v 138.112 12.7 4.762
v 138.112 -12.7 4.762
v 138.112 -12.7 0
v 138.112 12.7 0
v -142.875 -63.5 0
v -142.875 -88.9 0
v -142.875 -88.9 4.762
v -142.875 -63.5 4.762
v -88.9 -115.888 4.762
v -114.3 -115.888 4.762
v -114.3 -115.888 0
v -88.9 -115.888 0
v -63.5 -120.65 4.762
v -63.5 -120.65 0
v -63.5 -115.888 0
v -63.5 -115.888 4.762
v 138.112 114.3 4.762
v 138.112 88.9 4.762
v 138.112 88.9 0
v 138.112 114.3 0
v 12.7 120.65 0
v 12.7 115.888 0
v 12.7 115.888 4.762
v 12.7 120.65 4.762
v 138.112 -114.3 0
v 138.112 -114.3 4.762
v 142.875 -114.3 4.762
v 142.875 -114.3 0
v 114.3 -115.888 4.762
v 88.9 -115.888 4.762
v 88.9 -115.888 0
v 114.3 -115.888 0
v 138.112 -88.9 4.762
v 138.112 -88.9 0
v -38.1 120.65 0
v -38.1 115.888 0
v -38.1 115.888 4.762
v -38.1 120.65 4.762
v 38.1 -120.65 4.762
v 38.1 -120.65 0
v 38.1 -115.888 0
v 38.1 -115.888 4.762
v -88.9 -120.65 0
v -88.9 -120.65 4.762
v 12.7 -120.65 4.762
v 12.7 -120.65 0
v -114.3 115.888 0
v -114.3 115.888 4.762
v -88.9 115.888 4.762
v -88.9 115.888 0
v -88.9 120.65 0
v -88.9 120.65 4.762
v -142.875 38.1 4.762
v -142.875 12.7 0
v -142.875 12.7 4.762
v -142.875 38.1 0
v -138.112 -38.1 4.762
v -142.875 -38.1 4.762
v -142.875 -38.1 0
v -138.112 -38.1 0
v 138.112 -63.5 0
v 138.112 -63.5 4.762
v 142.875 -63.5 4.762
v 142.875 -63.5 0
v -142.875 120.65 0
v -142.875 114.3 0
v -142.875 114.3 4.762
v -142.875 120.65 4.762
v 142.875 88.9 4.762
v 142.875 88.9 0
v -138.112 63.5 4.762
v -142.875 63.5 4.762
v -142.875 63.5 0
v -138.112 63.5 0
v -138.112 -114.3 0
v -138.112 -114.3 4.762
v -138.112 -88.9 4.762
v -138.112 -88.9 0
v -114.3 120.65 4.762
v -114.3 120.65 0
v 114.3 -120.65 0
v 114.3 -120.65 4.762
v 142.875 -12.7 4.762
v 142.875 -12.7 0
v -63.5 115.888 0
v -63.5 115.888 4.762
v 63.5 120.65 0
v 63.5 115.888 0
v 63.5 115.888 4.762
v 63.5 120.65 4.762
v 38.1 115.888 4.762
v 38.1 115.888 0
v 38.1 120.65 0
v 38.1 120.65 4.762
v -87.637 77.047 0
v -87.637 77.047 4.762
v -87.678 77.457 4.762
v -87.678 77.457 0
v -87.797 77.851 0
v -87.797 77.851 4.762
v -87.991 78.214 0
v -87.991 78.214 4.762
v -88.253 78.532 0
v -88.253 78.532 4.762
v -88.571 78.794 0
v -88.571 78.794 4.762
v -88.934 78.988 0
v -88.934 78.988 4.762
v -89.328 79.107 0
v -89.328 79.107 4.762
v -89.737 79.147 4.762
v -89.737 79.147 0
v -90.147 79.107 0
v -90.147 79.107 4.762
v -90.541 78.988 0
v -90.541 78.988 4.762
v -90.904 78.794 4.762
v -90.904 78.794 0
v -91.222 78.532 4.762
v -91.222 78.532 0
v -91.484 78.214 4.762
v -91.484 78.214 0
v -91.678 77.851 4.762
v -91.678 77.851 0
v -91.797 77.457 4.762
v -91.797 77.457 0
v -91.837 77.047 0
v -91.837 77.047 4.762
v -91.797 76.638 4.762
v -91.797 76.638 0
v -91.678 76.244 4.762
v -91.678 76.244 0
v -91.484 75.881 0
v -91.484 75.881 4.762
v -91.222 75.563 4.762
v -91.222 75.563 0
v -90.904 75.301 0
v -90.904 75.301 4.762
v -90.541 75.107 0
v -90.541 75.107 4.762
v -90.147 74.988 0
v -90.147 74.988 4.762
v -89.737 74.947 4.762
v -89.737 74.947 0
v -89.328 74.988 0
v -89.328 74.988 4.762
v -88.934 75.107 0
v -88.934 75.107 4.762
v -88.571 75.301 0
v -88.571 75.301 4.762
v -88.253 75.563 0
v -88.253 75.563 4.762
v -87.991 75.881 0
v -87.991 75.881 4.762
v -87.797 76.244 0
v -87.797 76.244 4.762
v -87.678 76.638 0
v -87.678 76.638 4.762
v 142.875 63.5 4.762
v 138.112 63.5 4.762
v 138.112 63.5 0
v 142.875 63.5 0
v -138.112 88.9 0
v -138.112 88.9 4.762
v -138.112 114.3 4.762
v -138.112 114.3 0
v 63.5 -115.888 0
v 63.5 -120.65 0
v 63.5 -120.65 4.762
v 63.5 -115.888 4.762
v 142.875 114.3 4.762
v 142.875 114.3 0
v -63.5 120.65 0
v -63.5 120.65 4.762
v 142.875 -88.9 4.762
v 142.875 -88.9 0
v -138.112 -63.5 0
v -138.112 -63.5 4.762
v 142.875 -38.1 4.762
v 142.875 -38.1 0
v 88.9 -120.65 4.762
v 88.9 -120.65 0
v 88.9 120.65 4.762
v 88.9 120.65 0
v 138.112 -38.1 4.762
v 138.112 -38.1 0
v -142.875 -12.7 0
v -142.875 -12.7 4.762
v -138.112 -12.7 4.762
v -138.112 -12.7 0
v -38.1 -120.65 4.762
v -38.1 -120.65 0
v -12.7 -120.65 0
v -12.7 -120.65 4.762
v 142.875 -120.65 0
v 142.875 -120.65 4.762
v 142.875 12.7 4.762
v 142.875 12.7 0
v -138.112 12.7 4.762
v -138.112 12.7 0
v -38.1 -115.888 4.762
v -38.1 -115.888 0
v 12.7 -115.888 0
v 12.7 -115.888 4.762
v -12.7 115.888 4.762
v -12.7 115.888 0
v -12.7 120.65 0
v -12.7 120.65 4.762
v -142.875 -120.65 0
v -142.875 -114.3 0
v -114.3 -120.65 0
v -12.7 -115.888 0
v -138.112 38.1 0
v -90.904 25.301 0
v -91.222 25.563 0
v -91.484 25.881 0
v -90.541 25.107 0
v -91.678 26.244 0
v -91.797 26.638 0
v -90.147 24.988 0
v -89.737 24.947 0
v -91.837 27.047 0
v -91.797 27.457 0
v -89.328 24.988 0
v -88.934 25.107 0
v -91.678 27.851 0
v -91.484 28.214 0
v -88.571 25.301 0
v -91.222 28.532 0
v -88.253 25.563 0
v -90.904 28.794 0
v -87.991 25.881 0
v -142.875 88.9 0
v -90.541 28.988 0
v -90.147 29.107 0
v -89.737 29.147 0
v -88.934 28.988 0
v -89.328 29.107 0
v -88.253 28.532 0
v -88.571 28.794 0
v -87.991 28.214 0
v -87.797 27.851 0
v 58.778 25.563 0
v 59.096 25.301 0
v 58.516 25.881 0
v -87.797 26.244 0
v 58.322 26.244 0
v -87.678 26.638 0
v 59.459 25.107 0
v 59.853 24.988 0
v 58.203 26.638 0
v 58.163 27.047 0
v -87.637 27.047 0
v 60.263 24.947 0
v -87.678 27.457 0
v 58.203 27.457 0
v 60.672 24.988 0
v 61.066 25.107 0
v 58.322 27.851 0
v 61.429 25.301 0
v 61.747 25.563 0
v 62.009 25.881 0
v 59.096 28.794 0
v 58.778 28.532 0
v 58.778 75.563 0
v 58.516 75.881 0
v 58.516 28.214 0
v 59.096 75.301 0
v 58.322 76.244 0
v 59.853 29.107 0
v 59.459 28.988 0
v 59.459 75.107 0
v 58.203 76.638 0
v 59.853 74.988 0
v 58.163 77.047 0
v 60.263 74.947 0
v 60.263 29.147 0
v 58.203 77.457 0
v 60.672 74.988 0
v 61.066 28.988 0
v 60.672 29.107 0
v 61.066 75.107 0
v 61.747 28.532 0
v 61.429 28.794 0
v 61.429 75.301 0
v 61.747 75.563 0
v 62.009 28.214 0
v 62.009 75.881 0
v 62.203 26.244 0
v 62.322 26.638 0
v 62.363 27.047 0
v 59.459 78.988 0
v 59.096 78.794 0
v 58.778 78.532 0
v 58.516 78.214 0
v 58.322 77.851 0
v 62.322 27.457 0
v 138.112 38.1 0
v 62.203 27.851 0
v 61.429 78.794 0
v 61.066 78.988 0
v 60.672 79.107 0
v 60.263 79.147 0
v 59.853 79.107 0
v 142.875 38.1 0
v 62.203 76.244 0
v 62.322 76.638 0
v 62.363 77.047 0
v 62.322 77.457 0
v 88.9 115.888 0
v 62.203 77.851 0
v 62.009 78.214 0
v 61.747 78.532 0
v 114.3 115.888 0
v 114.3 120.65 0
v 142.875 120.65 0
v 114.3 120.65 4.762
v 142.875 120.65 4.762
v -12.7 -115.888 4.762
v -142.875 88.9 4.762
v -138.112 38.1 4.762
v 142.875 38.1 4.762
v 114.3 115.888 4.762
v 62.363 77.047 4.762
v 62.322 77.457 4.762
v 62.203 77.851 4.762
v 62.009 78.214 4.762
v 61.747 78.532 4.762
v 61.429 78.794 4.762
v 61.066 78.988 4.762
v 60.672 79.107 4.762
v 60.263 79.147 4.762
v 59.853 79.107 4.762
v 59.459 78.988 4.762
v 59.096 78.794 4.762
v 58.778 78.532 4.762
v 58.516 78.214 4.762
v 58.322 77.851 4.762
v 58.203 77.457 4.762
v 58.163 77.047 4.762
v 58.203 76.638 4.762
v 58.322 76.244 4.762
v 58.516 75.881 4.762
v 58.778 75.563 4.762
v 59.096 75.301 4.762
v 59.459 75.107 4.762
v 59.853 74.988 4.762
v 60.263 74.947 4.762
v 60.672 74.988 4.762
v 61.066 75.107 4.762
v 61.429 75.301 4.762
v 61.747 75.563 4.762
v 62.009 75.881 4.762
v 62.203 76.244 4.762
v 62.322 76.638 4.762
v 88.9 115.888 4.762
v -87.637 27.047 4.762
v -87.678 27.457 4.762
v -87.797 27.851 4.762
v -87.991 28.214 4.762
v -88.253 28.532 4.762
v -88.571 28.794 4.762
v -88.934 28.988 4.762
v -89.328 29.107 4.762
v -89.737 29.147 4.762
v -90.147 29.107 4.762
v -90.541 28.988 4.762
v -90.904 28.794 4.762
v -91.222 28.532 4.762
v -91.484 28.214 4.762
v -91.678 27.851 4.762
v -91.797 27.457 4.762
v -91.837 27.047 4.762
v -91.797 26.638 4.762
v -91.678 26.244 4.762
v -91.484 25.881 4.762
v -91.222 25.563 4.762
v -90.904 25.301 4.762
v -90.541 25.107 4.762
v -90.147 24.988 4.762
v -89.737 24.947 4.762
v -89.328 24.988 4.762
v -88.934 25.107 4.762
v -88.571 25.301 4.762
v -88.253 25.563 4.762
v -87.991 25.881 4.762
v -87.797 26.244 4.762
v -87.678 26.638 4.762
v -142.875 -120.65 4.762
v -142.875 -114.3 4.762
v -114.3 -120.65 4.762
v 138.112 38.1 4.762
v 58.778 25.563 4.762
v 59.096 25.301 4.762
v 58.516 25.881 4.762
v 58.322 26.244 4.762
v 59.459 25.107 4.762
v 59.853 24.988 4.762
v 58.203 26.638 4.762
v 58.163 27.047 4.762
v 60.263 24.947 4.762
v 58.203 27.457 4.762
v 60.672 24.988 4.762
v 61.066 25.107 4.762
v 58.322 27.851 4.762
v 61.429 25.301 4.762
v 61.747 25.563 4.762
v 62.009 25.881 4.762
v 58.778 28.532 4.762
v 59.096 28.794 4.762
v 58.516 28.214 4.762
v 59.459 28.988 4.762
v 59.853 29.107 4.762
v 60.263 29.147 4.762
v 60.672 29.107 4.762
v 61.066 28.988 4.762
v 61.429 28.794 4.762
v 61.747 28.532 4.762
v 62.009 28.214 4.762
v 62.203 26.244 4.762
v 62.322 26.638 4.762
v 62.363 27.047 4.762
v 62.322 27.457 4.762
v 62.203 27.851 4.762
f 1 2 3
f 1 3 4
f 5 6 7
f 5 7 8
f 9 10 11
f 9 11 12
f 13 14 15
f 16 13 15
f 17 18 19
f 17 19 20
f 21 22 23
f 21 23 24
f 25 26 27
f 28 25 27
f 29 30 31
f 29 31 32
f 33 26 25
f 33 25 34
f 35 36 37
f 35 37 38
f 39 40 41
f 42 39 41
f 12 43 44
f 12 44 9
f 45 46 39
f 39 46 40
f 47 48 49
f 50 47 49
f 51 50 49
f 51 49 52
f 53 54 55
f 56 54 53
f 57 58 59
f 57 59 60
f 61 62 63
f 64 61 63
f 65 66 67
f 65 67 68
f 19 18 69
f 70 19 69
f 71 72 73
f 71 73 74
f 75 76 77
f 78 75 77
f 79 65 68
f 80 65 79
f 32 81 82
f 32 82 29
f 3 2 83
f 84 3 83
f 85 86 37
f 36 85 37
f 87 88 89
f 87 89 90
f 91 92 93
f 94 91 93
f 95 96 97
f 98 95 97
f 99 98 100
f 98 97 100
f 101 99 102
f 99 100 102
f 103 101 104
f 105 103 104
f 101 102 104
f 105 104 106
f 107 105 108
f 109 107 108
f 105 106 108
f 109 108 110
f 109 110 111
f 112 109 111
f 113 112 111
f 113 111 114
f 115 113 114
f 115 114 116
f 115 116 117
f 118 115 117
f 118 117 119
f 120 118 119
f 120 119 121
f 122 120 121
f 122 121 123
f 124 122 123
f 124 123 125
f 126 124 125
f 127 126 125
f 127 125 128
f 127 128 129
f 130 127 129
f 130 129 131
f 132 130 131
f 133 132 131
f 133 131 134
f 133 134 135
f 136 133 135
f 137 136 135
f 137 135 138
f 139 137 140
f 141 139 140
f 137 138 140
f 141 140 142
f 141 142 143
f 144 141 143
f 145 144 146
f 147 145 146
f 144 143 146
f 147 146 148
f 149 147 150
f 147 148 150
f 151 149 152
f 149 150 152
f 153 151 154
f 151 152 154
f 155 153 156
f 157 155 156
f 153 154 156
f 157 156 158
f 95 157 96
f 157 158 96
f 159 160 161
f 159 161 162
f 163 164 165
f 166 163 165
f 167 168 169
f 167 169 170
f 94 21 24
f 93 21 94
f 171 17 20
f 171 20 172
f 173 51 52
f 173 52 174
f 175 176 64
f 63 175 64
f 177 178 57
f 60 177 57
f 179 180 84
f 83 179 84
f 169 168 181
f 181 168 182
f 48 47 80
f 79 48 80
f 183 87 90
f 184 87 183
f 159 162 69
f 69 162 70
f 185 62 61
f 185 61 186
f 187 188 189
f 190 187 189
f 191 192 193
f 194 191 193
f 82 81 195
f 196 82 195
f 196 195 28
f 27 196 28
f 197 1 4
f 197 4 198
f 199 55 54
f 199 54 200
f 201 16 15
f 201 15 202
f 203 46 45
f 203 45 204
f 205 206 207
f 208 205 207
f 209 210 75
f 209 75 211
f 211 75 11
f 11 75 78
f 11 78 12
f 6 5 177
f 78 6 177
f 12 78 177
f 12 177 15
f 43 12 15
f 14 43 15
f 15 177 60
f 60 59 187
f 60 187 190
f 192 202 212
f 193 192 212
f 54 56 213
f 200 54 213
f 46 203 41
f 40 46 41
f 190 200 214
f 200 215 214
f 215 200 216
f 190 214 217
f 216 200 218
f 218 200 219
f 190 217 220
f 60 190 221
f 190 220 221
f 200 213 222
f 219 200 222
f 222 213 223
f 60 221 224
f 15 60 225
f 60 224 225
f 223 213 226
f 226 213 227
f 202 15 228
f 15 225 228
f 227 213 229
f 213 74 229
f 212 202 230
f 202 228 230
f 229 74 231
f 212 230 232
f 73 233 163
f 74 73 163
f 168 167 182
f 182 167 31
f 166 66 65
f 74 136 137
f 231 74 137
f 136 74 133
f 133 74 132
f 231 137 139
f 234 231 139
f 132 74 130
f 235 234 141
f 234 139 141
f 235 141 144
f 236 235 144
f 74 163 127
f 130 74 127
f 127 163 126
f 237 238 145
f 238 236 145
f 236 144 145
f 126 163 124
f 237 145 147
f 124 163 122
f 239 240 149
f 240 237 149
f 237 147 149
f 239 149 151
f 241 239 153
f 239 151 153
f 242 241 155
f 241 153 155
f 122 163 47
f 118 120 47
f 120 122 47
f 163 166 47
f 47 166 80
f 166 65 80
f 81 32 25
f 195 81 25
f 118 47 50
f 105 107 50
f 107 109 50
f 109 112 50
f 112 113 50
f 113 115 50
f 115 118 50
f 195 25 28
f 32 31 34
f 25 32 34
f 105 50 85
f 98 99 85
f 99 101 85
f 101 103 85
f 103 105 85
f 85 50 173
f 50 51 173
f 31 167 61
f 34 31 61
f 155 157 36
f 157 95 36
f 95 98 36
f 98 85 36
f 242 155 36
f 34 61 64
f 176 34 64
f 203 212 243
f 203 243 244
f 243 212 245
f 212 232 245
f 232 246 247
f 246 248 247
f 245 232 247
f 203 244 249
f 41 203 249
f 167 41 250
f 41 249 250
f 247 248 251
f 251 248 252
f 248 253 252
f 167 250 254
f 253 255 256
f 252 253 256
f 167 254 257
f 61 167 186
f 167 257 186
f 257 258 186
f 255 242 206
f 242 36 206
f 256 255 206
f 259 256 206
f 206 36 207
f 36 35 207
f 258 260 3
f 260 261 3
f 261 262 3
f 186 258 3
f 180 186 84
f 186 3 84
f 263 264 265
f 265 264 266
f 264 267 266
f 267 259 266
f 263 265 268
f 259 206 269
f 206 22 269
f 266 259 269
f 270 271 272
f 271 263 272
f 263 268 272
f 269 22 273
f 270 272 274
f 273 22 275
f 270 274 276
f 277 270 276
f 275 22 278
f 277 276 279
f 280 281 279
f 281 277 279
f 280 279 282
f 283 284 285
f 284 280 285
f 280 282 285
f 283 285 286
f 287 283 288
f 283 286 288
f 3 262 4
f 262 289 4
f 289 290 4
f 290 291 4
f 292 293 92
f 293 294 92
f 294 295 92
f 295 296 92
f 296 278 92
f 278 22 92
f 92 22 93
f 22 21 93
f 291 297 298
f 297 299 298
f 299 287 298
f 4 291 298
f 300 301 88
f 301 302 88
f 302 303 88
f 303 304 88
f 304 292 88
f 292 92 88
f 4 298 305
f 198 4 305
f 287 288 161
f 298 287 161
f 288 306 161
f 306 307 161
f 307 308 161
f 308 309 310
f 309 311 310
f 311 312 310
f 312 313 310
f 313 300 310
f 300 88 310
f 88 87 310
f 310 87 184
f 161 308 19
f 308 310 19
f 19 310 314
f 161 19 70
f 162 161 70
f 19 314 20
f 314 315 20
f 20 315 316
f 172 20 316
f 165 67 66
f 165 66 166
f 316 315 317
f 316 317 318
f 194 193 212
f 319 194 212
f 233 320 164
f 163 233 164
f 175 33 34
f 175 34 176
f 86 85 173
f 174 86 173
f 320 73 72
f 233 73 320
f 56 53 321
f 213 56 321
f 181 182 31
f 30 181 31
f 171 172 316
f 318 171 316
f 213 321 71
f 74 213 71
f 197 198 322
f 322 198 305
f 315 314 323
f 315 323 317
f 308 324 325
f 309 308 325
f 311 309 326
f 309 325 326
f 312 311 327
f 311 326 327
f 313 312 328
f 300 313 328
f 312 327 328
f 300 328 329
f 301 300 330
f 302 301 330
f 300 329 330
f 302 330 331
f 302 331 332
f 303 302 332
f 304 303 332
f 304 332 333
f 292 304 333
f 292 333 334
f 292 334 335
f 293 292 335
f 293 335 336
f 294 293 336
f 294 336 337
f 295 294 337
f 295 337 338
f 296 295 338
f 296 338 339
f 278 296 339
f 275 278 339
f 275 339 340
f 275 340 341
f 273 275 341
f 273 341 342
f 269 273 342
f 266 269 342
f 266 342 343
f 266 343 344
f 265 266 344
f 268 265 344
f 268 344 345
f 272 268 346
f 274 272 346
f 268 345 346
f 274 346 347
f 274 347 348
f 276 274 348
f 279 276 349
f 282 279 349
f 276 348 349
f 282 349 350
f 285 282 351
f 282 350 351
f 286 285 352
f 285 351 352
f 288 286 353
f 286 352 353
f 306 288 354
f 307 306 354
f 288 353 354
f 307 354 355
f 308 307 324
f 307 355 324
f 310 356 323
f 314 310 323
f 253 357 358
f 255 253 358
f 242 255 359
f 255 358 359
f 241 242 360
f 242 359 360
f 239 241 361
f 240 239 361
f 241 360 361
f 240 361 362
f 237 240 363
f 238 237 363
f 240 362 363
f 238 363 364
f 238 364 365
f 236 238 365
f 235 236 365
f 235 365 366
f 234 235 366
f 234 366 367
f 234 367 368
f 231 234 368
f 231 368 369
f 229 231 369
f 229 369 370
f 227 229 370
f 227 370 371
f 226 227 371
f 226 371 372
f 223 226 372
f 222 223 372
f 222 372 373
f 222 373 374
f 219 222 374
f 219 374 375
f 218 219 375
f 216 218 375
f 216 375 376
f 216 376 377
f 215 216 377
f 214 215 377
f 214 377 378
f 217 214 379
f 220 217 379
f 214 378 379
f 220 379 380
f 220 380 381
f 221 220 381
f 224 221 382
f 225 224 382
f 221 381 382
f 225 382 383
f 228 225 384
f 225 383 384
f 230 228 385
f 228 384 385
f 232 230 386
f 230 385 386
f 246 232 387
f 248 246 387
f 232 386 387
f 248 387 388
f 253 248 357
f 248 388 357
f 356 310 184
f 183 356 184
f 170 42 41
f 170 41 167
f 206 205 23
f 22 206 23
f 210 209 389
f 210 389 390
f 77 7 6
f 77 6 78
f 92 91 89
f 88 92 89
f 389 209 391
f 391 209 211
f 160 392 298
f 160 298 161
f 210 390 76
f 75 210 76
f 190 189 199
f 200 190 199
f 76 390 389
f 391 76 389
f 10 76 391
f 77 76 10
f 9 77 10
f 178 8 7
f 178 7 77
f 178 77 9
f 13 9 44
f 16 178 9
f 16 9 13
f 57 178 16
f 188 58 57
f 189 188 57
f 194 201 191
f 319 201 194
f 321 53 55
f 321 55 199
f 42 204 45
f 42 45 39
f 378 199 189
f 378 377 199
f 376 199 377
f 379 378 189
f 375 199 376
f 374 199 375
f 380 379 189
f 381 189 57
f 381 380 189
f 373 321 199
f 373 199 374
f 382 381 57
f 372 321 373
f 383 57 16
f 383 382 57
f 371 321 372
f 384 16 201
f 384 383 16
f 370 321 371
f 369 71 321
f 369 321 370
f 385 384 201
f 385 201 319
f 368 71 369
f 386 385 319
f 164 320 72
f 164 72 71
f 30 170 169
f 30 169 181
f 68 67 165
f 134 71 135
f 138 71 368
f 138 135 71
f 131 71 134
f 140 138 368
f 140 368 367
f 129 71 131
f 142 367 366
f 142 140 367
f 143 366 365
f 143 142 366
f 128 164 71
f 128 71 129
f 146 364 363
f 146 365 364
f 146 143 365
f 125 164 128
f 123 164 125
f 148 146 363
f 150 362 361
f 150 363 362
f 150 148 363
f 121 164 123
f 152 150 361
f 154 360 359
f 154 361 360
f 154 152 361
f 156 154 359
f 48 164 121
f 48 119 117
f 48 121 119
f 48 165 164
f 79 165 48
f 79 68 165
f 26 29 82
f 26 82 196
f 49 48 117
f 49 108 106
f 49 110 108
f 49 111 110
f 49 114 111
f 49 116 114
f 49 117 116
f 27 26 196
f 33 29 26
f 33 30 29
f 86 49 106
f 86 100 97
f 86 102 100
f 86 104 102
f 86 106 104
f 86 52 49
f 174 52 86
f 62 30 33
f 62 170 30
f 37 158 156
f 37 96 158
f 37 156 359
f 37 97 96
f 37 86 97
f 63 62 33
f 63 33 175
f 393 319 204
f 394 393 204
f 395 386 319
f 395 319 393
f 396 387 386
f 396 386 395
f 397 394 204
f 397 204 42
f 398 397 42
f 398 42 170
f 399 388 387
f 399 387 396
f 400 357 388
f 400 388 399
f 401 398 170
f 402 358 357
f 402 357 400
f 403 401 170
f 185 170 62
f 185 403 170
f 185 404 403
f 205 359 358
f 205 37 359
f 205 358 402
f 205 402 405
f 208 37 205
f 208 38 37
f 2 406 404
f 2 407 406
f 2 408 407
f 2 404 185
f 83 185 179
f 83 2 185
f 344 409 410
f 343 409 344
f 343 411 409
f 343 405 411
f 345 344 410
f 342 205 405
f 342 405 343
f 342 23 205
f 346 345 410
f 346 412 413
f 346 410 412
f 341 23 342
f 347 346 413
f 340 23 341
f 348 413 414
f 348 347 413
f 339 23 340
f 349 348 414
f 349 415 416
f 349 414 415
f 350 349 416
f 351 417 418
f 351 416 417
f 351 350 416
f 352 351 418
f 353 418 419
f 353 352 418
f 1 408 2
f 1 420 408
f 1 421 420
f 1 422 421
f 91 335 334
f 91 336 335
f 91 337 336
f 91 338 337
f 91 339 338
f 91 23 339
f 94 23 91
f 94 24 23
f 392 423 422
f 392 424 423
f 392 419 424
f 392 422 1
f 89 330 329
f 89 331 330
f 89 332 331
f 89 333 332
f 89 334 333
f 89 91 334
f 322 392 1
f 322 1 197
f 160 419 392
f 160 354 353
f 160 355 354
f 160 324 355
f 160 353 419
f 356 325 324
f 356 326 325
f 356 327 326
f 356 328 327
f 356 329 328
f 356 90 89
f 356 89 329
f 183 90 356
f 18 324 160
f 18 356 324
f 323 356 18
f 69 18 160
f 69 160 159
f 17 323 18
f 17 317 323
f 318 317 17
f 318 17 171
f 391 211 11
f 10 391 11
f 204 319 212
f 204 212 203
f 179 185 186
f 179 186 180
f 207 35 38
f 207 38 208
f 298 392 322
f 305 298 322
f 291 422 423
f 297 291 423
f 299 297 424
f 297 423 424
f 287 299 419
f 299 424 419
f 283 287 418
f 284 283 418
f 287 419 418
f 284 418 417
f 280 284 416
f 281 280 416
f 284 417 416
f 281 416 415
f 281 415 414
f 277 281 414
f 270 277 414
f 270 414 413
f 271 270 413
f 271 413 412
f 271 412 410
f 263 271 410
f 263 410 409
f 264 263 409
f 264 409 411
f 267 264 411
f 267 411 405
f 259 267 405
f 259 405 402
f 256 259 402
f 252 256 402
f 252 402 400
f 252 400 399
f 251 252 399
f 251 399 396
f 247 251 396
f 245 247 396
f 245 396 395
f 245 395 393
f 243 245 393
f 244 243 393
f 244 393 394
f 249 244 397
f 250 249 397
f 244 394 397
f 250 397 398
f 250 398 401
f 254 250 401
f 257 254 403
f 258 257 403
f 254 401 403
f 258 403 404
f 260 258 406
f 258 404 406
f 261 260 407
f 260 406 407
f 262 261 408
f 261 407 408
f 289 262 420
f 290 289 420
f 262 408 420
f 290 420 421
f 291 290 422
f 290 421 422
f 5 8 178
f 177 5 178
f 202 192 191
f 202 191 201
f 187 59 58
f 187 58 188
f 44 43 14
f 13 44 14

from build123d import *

# Parameters (mm, degrees)
F0_W     = 285.75
F0_H     = 241.3
F1_DEPTH = 4.7625
F2_R     = 2.1
F3_DEPTH = 25.4
F4_W     = 25.4
F4_H     = 4.7625
F4_W_2   = 4.7625
F4_H_2   = 25.4
F5_DEPTH = 25.4


with BuildPart() as f1:
    # F0 (on Top) → F1 (new body)
    with BuildSketch(Plane.XY):
        Rectangle(F0_W, F0_H)
    extrude(amount=F1_DEPTH)

    # F2 (on face) → F3 (cut)
    with BuildSketch(Plane.XY.offset(4.7625)):
        with Locations((-89.737489, 77.047496)):
            Circle(F2_R)
        with Locations((-89.737489, 27.047495)):
            Circle(F2_R)
        with Locations((60.262516, 77.047496)):
            Circle(F2_R)
        with Locations((60.262516, 27.047495)):
            Circle(F2_R)
    extrude(amount=-F3_DEPTH, mode=Mode.SUBTRACT)

    # F4 (on face) → F5 (cut)
    with BuildSketch(Plane.XY.offset(4.7625)):
        with Locations((0, -118.26875)):
            Rectangle(F4_W, F4_H)
        with Locations((50.8, -118.26875)):
            Rectangle(F4_W, F4_H)
        with Locations((101.6, -118.26875)):
            Rectangle(F4_W, F4_H)
        with Locations((-50.8, -118.26875)):
            Rectangle(F4_W, F4_H)
        with Locations((-101.6, -118.26875)):
            Rectangle(F4_W, F4_H)
        with Locations((-101.6, 118.26875)):
            Rectangle(F4_W, F4_H)
        with Locations((-50.8, 118.26875)):
            Rectangle(F4_W, F4_H)
        with Locations((0, 118.26875)):
            Rectangle(F4_W, F4_H)
        with Locations((50.8, 118.26875)):
            Rectangle(F4_W, F4_H)
        with Locations((101.6, 118.26875)):
            Rectangle(F4_W, F4_H)
        with Locations((140.49375, 0)):
            Rectangle(F4_W_2, F4_H_2)
        with Locations((140.49375, 50.8)):
            Rectangle(F4_W_2, F4_H_2)
        with Locations((140.49375, 101.6)):
            Rectangle(F4_W_2, F4_H_2)
        with Locations((140.49375, -50.8)):
            Rectangle(F4_W_2, F4_H_2)
        with Locations((140.49375, -101.6)):
            Rectangle(F4_W_2, F4_H_2)
        with Locations((-140.49375, 101.6)):
            Rectangle(F4_W_2, F4_H_2)
        with Locations((-140.49375, 50.8)):
            Rectangle(F4_W_2, F4_H_2)
        with Locations((-140.49375, 0)):
            Rectangle(F4_W_2, F4_H_2)
        with Locations((-140.49375, -50.8)):
            Rectangle(F4_W_2, F4_H_2)
        with Locations((-140.49375, -101.6)):
            Rectangle(F4_W_2, F4_H_2)
    extrude(amount=-F5_DEPTH, mode=Mode.SUBTRACT)


solid = f1.part
